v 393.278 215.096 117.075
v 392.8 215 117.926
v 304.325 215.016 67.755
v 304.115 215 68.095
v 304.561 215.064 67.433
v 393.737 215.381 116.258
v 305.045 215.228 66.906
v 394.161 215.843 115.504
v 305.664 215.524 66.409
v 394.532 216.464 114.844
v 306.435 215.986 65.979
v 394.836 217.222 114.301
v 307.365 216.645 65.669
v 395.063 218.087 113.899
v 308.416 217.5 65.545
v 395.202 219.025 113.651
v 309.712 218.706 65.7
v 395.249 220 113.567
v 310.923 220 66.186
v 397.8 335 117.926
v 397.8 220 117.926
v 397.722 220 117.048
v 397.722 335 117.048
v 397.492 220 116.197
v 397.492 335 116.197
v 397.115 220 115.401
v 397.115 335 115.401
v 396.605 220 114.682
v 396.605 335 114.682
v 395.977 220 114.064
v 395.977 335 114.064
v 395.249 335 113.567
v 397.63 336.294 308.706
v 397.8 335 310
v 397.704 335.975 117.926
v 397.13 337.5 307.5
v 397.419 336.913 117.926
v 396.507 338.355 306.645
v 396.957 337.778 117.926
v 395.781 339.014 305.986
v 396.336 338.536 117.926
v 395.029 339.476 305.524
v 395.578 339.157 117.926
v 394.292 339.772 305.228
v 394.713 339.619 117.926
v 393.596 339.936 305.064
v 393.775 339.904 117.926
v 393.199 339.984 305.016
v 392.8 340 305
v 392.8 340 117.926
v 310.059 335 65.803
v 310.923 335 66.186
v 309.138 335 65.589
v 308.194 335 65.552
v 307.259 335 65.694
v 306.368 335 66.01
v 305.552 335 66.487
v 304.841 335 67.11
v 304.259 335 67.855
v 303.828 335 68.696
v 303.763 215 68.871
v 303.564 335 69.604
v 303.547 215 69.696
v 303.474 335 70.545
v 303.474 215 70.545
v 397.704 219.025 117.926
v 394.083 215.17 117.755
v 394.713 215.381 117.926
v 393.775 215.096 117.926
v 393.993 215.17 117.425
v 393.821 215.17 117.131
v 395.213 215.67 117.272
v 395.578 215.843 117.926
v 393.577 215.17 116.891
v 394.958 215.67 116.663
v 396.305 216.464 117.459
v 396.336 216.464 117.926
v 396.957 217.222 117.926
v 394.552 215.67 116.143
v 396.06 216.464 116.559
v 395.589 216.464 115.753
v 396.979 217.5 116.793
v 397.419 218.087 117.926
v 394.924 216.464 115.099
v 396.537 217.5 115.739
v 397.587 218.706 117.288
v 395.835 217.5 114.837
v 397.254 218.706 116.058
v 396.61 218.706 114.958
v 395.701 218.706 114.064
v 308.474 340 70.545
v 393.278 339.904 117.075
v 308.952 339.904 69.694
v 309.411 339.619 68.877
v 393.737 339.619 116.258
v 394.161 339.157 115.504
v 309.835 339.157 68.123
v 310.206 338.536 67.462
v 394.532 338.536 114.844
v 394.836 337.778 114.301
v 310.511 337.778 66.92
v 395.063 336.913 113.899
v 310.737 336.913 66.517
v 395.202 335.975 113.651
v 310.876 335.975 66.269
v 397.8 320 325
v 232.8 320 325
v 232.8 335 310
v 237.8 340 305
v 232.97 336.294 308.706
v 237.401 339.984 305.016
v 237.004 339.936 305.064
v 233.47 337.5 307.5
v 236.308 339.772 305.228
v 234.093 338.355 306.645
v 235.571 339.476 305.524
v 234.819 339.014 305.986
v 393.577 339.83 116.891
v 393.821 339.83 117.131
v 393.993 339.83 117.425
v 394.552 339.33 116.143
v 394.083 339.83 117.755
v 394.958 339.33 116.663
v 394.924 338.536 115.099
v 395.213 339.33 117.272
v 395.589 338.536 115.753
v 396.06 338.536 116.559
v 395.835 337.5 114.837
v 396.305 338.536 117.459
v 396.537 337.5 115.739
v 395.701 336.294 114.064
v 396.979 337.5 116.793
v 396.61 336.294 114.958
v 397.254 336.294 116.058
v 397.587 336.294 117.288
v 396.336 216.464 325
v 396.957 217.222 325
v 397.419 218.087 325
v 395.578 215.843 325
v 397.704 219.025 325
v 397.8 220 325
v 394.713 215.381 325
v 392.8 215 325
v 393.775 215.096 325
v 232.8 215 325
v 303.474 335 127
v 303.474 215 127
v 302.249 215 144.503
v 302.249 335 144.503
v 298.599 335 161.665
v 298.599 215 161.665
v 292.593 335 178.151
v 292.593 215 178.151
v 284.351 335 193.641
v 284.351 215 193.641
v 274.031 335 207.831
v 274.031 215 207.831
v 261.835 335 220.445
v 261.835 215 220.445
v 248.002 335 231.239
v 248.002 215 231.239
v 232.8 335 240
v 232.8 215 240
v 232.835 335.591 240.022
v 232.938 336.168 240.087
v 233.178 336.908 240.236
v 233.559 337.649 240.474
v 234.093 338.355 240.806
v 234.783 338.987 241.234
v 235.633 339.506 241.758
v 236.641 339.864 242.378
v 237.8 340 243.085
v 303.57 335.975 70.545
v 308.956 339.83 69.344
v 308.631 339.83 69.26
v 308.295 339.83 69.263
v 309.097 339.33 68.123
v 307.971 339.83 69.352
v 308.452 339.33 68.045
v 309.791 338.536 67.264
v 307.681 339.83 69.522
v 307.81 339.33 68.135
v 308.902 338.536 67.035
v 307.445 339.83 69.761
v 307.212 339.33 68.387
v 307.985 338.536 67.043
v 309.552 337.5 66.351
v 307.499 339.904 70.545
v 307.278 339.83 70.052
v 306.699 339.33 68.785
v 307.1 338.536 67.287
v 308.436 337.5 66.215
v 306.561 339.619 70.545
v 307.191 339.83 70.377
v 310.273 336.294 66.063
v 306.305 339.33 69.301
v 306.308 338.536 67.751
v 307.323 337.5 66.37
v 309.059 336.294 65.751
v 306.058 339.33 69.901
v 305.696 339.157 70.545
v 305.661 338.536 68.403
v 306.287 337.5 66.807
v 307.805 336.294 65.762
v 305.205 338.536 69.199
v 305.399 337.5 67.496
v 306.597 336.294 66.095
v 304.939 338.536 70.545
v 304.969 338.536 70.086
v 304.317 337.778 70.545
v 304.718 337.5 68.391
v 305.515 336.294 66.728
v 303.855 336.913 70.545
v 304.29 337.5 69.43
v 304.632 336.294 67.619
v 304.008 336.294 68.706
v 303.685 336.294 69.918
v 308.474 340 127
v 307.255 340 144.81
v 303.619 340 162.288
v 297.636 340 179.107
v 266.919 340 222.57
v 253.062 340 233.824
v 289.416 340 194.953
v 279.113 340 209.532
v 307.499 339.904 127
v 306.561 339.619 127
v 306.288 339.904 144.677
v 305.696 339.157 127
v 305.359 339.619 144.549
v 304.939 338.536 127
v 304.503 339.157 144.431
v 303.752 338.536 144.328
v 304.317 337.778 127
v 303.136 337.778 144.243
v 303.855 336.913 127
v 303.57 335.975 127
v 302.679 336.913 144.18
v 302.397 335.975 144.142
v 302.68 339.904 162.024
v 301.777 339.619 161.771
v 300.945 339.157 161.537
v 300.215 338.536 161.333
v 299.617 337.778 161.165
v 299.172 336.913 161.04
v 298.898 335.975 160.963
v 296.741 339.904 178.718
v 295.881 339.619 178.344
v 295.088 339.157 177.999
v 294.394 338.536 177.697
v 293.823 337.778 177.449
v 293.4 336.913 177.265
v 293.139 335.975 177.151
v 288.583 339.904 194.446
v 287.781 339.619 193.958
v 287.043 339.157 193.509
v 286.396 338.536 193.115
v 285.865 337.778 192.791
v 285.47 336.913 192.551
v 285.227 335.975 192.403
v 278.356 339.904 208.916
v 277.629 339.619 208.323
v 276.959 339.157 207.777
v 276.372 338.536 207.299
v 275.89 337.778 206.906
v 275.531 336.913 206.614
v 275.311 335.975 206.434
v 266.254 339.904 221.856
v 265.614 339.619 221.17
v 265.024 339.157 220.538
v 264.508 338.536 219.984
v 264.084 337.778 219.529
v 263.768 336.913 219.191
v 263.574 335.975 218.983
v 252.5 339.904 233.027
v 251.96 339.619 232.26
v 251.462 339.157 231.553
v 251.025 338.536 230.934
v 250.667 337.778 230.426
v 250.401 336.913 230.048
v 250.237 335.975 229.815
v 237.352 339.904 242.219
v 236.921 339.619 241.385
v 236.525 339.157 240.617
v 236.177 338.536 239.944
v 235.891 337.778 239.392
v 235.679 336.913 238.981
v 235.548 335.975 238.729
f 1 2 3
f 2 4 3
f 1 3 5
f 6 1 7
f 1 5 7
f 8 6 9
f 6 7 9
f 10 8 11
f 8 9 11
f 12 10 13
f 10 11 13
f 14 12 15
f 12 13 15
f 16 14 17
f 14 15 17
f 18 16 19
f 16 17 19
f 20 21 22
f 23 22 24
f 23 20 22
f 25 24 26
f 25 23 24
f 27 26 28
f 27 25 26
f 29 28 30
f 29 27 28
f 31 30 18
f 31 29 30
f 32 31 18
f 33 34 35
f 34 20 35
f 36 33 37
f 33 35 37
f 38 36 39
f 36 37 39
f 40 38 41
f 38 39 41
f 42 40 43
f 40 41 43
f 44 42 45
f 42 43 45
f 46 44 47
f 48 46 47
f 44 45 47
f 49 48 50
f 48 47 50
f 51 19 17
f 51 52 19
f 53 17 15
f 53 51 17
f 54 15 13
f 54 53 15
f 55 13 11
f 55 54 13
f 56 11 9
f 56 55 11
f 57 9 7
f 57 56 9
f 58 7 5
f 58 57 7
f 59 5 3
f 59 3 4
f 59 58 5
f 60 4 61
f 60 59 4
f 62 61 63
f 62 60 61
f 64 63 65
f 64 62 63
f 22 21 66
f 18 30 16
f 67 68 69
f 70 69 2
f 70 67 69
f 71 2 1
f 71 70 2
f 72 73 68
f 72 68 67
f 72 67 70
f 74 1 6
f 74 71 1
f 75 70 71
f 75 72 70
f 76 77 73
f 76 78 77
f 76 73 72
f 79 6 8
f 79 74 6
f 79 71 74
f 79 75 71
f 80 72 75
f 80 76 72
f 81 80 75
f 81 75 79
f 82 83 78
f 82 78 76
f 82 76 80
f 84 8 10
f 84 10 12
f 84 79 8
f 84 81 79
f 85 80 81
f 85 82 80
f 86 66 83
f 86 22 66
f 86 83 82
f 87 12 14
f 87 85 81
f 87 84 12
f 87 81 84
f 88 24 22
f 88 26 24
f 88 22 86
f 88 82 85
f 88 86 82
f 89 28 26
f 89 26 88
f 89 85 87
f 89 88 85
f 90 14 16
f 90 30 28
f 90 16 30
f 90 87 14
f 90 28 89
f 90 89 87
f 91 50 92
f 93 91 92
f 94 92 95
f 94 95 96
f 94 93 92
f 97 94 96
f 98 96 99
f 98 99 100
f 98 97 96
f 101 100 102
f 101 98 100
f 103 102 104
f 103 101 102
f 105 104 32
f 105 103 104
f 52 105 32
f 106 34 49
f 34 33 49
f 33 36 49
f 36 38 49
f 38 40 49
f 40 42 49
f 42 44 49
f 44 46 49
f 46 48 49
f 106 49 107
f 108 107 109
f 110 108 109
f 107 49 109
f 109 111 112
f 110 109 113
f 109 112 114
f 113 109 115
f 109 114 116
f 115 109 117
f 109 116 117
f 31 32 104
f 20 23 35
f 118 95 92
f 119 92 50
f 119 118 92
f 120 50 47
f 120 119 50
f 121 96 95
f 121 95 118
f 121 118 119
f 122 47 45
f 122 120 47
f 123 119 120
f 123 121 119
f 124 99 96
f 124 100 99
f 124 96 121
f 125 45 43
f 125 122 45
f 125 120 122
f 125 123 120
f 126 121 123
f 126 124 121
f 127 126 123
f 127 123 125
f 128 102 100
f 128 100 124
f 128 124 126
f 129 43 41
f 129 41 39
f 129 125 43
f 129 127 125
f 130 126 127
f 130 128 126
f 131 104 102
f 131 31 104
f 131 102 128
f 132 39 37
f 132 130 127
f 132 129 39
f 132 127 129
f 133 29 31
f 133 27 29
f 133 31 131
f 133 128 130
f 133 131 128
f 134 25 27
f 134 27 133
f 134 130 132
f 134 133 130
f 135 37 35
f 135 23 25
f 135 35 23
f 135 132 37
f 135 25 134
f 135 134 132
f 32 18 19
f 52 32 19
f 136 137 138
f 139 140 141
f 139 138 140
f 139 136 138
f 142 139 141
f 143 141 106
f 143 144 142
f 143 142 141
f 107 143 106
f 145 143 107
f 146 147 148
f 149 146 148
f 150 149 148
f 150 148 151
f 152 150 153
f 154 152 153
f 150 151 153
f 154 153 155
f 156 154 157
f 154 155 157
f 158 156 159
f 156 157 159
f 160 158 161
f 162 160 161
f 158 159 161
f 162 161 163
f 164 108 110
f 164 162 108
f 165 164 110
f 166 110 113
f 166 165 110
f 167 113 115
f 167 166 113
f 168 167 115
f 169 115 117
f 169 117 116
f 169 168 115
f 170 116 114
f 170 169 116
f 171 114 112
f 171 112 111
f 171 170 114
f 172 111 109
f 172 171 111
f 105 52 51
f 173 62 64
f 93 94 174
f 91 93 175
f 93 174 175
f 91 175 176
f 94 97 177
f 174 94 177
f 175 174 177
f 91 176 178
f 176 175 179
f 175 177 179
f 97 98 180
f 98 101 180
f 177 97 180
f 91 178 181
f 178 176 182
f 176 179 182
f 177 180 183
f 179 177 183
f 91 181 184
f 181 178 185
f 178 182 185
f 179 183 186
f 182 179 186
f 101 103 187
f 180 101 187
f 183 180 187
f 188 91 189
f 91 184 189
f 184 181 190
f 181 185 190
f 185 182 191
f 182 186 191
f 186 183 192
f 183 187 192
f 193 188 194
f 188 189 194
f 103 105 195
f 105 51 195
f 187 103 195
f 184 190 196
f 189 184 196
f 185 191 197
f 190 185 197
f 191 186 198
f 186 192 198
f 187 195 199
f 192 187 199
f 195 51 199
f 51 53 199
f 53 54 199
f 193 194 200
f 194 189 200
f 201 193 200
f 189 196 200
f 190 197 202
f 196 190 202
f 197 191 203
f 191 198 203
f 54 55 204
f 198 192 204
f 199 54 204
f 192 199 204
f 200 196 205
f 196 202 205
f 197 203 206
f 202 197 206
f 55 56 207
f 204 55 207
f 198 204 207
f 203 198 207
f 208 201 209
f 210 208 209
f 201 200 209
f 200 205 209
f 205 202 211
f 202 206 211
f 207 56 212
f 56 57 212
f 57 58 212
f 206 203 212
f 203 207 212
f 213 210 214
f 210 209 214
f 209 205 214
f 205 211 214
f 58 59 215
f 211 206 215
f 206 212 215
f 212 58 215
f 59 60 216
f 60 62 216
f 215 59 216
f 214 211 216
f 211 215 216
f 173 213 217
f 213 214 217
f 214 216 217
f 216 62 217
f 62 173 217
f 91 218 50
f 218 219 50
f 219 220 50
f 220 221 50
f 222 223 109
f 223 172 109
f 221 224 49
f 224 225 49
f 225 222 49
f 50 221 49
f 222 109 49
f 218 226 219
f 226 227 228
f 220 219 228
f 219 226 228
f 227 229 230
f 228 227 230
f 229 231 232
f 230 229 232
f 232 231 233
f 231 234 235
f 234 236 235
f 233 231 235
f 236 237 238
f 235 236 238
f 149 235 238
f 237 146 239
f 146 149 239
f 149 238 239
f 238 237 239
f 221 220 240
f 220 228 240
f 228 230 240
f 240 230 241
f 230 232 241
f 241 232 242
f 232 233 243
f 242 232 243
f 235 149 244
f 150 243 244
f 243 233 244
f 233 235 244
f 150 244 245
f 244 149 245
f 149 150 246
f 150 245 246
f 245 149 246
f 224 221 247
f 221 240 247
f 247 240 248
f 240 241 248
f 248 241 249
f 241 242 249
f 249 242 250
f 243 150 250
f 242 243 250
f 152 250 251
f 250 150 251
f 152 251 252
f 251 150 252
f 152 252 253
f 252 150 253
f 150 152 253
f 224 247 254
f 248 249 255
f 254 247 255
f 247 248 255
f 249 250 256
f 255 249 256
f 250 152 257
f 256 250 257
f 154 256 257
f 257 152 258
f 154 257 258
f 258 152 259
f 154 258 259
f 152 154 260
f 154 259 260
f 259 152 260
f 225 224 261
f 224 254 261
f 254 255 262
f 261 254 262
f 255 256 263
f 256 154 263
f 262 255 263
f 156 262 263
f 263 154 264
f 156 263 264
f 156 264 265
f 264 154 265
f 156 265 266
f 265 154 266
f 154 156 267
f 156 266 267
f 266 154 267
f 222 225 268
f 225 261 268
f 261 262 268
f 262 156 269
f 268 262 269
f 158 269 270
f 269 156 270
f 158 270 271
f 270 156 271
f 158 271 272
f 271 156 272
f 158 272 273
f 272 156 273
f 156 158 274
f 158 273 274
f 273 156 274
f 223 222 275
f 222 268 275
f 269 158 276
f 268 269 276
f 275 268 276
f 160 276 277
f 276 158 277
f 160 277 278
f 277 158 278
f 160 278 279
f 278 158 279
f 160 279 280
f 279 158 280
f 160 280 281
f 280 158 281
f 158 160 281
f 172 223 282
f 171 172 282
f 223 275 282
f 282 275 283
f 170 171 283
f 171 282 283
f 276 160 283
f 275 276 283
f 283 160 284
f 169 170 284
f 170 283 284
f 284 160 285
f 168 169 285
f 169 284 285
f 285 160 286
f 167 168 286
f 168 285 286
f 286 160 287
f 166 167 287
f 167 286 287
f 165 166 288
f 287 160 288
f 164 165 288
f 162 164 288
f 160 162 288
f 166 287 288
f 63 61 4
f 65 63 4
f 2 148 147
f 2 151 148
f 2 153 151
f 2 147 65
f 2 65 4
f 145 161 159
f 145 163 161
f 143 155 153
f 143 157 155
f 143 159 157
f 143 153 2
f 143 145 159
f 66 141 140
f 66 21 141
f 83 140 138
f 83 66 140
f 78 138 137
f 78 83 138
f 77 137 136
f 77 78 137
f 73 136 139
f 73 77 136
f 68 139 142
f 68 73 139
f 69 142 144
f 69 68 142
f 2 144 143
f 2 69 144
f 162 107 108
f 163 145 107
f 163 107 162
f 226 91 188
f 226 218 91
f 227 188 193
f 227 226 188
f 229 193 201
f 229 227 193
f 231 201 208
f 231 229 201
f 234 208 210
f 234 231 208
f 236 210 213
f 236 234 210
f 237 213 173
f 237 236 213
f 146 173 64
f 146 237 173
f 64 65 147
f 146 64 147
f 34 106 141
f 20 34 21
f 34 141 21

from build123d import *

# Parameters (mm, degrees)
PAD010_DEPTH    = 125
CHAMFER003_SIZE = 20
FILLET007_R     = 5


with BuildPart() as part:
    # Sketch014 → Pad010 (new body)
    with BuildSketch(Plane.XZ.offset(-215)):
        with BuildLine():
            Line((397.8, 325), (232.8, 325))
            Line((232.8, 325), (232.8, 240))
            ThreePointArc((303.474182, 126.999993), (284.350647, 193.640525), (232.8, 240))
            Line((303.474182, 61.999993), (303.474182, 126.999993))
            Line((397.8, 115), (303.474182, 61.999993))
            Line((397.8, 325), (397.8, 115))
        make_face()
    extrude(amount=-PAD010_DEPTH)

    # Chamfer003
    chamfer003_edges = [part.edges().sort_by_distance(p)[0] for p in [
        (315.3, 340, 325),
    ]]
    chamfer(chamfer003_edges, length=CHAMFER003_SIZE)

    # Fillet007
    fillet007_edges = [part.edges().sort_by_distance(p)[0] for p in [
        (397.8, 340, 210),
        (397.8, 277.5, 115),
        (350.637091, 340, 88.499996),
        (303.474182, 340, 94.499993),
        (284.350647, 340, 193.640525),
        (232.8, 340, 272.5),
        (397.8, 215, 220),
        (350.637091, 215, 88.499996),
        (303.474182, 277.5, 61.999993),
    ]]
    fillet(fillet007_edges, radius=FILLET007_R)


solid = part.part
